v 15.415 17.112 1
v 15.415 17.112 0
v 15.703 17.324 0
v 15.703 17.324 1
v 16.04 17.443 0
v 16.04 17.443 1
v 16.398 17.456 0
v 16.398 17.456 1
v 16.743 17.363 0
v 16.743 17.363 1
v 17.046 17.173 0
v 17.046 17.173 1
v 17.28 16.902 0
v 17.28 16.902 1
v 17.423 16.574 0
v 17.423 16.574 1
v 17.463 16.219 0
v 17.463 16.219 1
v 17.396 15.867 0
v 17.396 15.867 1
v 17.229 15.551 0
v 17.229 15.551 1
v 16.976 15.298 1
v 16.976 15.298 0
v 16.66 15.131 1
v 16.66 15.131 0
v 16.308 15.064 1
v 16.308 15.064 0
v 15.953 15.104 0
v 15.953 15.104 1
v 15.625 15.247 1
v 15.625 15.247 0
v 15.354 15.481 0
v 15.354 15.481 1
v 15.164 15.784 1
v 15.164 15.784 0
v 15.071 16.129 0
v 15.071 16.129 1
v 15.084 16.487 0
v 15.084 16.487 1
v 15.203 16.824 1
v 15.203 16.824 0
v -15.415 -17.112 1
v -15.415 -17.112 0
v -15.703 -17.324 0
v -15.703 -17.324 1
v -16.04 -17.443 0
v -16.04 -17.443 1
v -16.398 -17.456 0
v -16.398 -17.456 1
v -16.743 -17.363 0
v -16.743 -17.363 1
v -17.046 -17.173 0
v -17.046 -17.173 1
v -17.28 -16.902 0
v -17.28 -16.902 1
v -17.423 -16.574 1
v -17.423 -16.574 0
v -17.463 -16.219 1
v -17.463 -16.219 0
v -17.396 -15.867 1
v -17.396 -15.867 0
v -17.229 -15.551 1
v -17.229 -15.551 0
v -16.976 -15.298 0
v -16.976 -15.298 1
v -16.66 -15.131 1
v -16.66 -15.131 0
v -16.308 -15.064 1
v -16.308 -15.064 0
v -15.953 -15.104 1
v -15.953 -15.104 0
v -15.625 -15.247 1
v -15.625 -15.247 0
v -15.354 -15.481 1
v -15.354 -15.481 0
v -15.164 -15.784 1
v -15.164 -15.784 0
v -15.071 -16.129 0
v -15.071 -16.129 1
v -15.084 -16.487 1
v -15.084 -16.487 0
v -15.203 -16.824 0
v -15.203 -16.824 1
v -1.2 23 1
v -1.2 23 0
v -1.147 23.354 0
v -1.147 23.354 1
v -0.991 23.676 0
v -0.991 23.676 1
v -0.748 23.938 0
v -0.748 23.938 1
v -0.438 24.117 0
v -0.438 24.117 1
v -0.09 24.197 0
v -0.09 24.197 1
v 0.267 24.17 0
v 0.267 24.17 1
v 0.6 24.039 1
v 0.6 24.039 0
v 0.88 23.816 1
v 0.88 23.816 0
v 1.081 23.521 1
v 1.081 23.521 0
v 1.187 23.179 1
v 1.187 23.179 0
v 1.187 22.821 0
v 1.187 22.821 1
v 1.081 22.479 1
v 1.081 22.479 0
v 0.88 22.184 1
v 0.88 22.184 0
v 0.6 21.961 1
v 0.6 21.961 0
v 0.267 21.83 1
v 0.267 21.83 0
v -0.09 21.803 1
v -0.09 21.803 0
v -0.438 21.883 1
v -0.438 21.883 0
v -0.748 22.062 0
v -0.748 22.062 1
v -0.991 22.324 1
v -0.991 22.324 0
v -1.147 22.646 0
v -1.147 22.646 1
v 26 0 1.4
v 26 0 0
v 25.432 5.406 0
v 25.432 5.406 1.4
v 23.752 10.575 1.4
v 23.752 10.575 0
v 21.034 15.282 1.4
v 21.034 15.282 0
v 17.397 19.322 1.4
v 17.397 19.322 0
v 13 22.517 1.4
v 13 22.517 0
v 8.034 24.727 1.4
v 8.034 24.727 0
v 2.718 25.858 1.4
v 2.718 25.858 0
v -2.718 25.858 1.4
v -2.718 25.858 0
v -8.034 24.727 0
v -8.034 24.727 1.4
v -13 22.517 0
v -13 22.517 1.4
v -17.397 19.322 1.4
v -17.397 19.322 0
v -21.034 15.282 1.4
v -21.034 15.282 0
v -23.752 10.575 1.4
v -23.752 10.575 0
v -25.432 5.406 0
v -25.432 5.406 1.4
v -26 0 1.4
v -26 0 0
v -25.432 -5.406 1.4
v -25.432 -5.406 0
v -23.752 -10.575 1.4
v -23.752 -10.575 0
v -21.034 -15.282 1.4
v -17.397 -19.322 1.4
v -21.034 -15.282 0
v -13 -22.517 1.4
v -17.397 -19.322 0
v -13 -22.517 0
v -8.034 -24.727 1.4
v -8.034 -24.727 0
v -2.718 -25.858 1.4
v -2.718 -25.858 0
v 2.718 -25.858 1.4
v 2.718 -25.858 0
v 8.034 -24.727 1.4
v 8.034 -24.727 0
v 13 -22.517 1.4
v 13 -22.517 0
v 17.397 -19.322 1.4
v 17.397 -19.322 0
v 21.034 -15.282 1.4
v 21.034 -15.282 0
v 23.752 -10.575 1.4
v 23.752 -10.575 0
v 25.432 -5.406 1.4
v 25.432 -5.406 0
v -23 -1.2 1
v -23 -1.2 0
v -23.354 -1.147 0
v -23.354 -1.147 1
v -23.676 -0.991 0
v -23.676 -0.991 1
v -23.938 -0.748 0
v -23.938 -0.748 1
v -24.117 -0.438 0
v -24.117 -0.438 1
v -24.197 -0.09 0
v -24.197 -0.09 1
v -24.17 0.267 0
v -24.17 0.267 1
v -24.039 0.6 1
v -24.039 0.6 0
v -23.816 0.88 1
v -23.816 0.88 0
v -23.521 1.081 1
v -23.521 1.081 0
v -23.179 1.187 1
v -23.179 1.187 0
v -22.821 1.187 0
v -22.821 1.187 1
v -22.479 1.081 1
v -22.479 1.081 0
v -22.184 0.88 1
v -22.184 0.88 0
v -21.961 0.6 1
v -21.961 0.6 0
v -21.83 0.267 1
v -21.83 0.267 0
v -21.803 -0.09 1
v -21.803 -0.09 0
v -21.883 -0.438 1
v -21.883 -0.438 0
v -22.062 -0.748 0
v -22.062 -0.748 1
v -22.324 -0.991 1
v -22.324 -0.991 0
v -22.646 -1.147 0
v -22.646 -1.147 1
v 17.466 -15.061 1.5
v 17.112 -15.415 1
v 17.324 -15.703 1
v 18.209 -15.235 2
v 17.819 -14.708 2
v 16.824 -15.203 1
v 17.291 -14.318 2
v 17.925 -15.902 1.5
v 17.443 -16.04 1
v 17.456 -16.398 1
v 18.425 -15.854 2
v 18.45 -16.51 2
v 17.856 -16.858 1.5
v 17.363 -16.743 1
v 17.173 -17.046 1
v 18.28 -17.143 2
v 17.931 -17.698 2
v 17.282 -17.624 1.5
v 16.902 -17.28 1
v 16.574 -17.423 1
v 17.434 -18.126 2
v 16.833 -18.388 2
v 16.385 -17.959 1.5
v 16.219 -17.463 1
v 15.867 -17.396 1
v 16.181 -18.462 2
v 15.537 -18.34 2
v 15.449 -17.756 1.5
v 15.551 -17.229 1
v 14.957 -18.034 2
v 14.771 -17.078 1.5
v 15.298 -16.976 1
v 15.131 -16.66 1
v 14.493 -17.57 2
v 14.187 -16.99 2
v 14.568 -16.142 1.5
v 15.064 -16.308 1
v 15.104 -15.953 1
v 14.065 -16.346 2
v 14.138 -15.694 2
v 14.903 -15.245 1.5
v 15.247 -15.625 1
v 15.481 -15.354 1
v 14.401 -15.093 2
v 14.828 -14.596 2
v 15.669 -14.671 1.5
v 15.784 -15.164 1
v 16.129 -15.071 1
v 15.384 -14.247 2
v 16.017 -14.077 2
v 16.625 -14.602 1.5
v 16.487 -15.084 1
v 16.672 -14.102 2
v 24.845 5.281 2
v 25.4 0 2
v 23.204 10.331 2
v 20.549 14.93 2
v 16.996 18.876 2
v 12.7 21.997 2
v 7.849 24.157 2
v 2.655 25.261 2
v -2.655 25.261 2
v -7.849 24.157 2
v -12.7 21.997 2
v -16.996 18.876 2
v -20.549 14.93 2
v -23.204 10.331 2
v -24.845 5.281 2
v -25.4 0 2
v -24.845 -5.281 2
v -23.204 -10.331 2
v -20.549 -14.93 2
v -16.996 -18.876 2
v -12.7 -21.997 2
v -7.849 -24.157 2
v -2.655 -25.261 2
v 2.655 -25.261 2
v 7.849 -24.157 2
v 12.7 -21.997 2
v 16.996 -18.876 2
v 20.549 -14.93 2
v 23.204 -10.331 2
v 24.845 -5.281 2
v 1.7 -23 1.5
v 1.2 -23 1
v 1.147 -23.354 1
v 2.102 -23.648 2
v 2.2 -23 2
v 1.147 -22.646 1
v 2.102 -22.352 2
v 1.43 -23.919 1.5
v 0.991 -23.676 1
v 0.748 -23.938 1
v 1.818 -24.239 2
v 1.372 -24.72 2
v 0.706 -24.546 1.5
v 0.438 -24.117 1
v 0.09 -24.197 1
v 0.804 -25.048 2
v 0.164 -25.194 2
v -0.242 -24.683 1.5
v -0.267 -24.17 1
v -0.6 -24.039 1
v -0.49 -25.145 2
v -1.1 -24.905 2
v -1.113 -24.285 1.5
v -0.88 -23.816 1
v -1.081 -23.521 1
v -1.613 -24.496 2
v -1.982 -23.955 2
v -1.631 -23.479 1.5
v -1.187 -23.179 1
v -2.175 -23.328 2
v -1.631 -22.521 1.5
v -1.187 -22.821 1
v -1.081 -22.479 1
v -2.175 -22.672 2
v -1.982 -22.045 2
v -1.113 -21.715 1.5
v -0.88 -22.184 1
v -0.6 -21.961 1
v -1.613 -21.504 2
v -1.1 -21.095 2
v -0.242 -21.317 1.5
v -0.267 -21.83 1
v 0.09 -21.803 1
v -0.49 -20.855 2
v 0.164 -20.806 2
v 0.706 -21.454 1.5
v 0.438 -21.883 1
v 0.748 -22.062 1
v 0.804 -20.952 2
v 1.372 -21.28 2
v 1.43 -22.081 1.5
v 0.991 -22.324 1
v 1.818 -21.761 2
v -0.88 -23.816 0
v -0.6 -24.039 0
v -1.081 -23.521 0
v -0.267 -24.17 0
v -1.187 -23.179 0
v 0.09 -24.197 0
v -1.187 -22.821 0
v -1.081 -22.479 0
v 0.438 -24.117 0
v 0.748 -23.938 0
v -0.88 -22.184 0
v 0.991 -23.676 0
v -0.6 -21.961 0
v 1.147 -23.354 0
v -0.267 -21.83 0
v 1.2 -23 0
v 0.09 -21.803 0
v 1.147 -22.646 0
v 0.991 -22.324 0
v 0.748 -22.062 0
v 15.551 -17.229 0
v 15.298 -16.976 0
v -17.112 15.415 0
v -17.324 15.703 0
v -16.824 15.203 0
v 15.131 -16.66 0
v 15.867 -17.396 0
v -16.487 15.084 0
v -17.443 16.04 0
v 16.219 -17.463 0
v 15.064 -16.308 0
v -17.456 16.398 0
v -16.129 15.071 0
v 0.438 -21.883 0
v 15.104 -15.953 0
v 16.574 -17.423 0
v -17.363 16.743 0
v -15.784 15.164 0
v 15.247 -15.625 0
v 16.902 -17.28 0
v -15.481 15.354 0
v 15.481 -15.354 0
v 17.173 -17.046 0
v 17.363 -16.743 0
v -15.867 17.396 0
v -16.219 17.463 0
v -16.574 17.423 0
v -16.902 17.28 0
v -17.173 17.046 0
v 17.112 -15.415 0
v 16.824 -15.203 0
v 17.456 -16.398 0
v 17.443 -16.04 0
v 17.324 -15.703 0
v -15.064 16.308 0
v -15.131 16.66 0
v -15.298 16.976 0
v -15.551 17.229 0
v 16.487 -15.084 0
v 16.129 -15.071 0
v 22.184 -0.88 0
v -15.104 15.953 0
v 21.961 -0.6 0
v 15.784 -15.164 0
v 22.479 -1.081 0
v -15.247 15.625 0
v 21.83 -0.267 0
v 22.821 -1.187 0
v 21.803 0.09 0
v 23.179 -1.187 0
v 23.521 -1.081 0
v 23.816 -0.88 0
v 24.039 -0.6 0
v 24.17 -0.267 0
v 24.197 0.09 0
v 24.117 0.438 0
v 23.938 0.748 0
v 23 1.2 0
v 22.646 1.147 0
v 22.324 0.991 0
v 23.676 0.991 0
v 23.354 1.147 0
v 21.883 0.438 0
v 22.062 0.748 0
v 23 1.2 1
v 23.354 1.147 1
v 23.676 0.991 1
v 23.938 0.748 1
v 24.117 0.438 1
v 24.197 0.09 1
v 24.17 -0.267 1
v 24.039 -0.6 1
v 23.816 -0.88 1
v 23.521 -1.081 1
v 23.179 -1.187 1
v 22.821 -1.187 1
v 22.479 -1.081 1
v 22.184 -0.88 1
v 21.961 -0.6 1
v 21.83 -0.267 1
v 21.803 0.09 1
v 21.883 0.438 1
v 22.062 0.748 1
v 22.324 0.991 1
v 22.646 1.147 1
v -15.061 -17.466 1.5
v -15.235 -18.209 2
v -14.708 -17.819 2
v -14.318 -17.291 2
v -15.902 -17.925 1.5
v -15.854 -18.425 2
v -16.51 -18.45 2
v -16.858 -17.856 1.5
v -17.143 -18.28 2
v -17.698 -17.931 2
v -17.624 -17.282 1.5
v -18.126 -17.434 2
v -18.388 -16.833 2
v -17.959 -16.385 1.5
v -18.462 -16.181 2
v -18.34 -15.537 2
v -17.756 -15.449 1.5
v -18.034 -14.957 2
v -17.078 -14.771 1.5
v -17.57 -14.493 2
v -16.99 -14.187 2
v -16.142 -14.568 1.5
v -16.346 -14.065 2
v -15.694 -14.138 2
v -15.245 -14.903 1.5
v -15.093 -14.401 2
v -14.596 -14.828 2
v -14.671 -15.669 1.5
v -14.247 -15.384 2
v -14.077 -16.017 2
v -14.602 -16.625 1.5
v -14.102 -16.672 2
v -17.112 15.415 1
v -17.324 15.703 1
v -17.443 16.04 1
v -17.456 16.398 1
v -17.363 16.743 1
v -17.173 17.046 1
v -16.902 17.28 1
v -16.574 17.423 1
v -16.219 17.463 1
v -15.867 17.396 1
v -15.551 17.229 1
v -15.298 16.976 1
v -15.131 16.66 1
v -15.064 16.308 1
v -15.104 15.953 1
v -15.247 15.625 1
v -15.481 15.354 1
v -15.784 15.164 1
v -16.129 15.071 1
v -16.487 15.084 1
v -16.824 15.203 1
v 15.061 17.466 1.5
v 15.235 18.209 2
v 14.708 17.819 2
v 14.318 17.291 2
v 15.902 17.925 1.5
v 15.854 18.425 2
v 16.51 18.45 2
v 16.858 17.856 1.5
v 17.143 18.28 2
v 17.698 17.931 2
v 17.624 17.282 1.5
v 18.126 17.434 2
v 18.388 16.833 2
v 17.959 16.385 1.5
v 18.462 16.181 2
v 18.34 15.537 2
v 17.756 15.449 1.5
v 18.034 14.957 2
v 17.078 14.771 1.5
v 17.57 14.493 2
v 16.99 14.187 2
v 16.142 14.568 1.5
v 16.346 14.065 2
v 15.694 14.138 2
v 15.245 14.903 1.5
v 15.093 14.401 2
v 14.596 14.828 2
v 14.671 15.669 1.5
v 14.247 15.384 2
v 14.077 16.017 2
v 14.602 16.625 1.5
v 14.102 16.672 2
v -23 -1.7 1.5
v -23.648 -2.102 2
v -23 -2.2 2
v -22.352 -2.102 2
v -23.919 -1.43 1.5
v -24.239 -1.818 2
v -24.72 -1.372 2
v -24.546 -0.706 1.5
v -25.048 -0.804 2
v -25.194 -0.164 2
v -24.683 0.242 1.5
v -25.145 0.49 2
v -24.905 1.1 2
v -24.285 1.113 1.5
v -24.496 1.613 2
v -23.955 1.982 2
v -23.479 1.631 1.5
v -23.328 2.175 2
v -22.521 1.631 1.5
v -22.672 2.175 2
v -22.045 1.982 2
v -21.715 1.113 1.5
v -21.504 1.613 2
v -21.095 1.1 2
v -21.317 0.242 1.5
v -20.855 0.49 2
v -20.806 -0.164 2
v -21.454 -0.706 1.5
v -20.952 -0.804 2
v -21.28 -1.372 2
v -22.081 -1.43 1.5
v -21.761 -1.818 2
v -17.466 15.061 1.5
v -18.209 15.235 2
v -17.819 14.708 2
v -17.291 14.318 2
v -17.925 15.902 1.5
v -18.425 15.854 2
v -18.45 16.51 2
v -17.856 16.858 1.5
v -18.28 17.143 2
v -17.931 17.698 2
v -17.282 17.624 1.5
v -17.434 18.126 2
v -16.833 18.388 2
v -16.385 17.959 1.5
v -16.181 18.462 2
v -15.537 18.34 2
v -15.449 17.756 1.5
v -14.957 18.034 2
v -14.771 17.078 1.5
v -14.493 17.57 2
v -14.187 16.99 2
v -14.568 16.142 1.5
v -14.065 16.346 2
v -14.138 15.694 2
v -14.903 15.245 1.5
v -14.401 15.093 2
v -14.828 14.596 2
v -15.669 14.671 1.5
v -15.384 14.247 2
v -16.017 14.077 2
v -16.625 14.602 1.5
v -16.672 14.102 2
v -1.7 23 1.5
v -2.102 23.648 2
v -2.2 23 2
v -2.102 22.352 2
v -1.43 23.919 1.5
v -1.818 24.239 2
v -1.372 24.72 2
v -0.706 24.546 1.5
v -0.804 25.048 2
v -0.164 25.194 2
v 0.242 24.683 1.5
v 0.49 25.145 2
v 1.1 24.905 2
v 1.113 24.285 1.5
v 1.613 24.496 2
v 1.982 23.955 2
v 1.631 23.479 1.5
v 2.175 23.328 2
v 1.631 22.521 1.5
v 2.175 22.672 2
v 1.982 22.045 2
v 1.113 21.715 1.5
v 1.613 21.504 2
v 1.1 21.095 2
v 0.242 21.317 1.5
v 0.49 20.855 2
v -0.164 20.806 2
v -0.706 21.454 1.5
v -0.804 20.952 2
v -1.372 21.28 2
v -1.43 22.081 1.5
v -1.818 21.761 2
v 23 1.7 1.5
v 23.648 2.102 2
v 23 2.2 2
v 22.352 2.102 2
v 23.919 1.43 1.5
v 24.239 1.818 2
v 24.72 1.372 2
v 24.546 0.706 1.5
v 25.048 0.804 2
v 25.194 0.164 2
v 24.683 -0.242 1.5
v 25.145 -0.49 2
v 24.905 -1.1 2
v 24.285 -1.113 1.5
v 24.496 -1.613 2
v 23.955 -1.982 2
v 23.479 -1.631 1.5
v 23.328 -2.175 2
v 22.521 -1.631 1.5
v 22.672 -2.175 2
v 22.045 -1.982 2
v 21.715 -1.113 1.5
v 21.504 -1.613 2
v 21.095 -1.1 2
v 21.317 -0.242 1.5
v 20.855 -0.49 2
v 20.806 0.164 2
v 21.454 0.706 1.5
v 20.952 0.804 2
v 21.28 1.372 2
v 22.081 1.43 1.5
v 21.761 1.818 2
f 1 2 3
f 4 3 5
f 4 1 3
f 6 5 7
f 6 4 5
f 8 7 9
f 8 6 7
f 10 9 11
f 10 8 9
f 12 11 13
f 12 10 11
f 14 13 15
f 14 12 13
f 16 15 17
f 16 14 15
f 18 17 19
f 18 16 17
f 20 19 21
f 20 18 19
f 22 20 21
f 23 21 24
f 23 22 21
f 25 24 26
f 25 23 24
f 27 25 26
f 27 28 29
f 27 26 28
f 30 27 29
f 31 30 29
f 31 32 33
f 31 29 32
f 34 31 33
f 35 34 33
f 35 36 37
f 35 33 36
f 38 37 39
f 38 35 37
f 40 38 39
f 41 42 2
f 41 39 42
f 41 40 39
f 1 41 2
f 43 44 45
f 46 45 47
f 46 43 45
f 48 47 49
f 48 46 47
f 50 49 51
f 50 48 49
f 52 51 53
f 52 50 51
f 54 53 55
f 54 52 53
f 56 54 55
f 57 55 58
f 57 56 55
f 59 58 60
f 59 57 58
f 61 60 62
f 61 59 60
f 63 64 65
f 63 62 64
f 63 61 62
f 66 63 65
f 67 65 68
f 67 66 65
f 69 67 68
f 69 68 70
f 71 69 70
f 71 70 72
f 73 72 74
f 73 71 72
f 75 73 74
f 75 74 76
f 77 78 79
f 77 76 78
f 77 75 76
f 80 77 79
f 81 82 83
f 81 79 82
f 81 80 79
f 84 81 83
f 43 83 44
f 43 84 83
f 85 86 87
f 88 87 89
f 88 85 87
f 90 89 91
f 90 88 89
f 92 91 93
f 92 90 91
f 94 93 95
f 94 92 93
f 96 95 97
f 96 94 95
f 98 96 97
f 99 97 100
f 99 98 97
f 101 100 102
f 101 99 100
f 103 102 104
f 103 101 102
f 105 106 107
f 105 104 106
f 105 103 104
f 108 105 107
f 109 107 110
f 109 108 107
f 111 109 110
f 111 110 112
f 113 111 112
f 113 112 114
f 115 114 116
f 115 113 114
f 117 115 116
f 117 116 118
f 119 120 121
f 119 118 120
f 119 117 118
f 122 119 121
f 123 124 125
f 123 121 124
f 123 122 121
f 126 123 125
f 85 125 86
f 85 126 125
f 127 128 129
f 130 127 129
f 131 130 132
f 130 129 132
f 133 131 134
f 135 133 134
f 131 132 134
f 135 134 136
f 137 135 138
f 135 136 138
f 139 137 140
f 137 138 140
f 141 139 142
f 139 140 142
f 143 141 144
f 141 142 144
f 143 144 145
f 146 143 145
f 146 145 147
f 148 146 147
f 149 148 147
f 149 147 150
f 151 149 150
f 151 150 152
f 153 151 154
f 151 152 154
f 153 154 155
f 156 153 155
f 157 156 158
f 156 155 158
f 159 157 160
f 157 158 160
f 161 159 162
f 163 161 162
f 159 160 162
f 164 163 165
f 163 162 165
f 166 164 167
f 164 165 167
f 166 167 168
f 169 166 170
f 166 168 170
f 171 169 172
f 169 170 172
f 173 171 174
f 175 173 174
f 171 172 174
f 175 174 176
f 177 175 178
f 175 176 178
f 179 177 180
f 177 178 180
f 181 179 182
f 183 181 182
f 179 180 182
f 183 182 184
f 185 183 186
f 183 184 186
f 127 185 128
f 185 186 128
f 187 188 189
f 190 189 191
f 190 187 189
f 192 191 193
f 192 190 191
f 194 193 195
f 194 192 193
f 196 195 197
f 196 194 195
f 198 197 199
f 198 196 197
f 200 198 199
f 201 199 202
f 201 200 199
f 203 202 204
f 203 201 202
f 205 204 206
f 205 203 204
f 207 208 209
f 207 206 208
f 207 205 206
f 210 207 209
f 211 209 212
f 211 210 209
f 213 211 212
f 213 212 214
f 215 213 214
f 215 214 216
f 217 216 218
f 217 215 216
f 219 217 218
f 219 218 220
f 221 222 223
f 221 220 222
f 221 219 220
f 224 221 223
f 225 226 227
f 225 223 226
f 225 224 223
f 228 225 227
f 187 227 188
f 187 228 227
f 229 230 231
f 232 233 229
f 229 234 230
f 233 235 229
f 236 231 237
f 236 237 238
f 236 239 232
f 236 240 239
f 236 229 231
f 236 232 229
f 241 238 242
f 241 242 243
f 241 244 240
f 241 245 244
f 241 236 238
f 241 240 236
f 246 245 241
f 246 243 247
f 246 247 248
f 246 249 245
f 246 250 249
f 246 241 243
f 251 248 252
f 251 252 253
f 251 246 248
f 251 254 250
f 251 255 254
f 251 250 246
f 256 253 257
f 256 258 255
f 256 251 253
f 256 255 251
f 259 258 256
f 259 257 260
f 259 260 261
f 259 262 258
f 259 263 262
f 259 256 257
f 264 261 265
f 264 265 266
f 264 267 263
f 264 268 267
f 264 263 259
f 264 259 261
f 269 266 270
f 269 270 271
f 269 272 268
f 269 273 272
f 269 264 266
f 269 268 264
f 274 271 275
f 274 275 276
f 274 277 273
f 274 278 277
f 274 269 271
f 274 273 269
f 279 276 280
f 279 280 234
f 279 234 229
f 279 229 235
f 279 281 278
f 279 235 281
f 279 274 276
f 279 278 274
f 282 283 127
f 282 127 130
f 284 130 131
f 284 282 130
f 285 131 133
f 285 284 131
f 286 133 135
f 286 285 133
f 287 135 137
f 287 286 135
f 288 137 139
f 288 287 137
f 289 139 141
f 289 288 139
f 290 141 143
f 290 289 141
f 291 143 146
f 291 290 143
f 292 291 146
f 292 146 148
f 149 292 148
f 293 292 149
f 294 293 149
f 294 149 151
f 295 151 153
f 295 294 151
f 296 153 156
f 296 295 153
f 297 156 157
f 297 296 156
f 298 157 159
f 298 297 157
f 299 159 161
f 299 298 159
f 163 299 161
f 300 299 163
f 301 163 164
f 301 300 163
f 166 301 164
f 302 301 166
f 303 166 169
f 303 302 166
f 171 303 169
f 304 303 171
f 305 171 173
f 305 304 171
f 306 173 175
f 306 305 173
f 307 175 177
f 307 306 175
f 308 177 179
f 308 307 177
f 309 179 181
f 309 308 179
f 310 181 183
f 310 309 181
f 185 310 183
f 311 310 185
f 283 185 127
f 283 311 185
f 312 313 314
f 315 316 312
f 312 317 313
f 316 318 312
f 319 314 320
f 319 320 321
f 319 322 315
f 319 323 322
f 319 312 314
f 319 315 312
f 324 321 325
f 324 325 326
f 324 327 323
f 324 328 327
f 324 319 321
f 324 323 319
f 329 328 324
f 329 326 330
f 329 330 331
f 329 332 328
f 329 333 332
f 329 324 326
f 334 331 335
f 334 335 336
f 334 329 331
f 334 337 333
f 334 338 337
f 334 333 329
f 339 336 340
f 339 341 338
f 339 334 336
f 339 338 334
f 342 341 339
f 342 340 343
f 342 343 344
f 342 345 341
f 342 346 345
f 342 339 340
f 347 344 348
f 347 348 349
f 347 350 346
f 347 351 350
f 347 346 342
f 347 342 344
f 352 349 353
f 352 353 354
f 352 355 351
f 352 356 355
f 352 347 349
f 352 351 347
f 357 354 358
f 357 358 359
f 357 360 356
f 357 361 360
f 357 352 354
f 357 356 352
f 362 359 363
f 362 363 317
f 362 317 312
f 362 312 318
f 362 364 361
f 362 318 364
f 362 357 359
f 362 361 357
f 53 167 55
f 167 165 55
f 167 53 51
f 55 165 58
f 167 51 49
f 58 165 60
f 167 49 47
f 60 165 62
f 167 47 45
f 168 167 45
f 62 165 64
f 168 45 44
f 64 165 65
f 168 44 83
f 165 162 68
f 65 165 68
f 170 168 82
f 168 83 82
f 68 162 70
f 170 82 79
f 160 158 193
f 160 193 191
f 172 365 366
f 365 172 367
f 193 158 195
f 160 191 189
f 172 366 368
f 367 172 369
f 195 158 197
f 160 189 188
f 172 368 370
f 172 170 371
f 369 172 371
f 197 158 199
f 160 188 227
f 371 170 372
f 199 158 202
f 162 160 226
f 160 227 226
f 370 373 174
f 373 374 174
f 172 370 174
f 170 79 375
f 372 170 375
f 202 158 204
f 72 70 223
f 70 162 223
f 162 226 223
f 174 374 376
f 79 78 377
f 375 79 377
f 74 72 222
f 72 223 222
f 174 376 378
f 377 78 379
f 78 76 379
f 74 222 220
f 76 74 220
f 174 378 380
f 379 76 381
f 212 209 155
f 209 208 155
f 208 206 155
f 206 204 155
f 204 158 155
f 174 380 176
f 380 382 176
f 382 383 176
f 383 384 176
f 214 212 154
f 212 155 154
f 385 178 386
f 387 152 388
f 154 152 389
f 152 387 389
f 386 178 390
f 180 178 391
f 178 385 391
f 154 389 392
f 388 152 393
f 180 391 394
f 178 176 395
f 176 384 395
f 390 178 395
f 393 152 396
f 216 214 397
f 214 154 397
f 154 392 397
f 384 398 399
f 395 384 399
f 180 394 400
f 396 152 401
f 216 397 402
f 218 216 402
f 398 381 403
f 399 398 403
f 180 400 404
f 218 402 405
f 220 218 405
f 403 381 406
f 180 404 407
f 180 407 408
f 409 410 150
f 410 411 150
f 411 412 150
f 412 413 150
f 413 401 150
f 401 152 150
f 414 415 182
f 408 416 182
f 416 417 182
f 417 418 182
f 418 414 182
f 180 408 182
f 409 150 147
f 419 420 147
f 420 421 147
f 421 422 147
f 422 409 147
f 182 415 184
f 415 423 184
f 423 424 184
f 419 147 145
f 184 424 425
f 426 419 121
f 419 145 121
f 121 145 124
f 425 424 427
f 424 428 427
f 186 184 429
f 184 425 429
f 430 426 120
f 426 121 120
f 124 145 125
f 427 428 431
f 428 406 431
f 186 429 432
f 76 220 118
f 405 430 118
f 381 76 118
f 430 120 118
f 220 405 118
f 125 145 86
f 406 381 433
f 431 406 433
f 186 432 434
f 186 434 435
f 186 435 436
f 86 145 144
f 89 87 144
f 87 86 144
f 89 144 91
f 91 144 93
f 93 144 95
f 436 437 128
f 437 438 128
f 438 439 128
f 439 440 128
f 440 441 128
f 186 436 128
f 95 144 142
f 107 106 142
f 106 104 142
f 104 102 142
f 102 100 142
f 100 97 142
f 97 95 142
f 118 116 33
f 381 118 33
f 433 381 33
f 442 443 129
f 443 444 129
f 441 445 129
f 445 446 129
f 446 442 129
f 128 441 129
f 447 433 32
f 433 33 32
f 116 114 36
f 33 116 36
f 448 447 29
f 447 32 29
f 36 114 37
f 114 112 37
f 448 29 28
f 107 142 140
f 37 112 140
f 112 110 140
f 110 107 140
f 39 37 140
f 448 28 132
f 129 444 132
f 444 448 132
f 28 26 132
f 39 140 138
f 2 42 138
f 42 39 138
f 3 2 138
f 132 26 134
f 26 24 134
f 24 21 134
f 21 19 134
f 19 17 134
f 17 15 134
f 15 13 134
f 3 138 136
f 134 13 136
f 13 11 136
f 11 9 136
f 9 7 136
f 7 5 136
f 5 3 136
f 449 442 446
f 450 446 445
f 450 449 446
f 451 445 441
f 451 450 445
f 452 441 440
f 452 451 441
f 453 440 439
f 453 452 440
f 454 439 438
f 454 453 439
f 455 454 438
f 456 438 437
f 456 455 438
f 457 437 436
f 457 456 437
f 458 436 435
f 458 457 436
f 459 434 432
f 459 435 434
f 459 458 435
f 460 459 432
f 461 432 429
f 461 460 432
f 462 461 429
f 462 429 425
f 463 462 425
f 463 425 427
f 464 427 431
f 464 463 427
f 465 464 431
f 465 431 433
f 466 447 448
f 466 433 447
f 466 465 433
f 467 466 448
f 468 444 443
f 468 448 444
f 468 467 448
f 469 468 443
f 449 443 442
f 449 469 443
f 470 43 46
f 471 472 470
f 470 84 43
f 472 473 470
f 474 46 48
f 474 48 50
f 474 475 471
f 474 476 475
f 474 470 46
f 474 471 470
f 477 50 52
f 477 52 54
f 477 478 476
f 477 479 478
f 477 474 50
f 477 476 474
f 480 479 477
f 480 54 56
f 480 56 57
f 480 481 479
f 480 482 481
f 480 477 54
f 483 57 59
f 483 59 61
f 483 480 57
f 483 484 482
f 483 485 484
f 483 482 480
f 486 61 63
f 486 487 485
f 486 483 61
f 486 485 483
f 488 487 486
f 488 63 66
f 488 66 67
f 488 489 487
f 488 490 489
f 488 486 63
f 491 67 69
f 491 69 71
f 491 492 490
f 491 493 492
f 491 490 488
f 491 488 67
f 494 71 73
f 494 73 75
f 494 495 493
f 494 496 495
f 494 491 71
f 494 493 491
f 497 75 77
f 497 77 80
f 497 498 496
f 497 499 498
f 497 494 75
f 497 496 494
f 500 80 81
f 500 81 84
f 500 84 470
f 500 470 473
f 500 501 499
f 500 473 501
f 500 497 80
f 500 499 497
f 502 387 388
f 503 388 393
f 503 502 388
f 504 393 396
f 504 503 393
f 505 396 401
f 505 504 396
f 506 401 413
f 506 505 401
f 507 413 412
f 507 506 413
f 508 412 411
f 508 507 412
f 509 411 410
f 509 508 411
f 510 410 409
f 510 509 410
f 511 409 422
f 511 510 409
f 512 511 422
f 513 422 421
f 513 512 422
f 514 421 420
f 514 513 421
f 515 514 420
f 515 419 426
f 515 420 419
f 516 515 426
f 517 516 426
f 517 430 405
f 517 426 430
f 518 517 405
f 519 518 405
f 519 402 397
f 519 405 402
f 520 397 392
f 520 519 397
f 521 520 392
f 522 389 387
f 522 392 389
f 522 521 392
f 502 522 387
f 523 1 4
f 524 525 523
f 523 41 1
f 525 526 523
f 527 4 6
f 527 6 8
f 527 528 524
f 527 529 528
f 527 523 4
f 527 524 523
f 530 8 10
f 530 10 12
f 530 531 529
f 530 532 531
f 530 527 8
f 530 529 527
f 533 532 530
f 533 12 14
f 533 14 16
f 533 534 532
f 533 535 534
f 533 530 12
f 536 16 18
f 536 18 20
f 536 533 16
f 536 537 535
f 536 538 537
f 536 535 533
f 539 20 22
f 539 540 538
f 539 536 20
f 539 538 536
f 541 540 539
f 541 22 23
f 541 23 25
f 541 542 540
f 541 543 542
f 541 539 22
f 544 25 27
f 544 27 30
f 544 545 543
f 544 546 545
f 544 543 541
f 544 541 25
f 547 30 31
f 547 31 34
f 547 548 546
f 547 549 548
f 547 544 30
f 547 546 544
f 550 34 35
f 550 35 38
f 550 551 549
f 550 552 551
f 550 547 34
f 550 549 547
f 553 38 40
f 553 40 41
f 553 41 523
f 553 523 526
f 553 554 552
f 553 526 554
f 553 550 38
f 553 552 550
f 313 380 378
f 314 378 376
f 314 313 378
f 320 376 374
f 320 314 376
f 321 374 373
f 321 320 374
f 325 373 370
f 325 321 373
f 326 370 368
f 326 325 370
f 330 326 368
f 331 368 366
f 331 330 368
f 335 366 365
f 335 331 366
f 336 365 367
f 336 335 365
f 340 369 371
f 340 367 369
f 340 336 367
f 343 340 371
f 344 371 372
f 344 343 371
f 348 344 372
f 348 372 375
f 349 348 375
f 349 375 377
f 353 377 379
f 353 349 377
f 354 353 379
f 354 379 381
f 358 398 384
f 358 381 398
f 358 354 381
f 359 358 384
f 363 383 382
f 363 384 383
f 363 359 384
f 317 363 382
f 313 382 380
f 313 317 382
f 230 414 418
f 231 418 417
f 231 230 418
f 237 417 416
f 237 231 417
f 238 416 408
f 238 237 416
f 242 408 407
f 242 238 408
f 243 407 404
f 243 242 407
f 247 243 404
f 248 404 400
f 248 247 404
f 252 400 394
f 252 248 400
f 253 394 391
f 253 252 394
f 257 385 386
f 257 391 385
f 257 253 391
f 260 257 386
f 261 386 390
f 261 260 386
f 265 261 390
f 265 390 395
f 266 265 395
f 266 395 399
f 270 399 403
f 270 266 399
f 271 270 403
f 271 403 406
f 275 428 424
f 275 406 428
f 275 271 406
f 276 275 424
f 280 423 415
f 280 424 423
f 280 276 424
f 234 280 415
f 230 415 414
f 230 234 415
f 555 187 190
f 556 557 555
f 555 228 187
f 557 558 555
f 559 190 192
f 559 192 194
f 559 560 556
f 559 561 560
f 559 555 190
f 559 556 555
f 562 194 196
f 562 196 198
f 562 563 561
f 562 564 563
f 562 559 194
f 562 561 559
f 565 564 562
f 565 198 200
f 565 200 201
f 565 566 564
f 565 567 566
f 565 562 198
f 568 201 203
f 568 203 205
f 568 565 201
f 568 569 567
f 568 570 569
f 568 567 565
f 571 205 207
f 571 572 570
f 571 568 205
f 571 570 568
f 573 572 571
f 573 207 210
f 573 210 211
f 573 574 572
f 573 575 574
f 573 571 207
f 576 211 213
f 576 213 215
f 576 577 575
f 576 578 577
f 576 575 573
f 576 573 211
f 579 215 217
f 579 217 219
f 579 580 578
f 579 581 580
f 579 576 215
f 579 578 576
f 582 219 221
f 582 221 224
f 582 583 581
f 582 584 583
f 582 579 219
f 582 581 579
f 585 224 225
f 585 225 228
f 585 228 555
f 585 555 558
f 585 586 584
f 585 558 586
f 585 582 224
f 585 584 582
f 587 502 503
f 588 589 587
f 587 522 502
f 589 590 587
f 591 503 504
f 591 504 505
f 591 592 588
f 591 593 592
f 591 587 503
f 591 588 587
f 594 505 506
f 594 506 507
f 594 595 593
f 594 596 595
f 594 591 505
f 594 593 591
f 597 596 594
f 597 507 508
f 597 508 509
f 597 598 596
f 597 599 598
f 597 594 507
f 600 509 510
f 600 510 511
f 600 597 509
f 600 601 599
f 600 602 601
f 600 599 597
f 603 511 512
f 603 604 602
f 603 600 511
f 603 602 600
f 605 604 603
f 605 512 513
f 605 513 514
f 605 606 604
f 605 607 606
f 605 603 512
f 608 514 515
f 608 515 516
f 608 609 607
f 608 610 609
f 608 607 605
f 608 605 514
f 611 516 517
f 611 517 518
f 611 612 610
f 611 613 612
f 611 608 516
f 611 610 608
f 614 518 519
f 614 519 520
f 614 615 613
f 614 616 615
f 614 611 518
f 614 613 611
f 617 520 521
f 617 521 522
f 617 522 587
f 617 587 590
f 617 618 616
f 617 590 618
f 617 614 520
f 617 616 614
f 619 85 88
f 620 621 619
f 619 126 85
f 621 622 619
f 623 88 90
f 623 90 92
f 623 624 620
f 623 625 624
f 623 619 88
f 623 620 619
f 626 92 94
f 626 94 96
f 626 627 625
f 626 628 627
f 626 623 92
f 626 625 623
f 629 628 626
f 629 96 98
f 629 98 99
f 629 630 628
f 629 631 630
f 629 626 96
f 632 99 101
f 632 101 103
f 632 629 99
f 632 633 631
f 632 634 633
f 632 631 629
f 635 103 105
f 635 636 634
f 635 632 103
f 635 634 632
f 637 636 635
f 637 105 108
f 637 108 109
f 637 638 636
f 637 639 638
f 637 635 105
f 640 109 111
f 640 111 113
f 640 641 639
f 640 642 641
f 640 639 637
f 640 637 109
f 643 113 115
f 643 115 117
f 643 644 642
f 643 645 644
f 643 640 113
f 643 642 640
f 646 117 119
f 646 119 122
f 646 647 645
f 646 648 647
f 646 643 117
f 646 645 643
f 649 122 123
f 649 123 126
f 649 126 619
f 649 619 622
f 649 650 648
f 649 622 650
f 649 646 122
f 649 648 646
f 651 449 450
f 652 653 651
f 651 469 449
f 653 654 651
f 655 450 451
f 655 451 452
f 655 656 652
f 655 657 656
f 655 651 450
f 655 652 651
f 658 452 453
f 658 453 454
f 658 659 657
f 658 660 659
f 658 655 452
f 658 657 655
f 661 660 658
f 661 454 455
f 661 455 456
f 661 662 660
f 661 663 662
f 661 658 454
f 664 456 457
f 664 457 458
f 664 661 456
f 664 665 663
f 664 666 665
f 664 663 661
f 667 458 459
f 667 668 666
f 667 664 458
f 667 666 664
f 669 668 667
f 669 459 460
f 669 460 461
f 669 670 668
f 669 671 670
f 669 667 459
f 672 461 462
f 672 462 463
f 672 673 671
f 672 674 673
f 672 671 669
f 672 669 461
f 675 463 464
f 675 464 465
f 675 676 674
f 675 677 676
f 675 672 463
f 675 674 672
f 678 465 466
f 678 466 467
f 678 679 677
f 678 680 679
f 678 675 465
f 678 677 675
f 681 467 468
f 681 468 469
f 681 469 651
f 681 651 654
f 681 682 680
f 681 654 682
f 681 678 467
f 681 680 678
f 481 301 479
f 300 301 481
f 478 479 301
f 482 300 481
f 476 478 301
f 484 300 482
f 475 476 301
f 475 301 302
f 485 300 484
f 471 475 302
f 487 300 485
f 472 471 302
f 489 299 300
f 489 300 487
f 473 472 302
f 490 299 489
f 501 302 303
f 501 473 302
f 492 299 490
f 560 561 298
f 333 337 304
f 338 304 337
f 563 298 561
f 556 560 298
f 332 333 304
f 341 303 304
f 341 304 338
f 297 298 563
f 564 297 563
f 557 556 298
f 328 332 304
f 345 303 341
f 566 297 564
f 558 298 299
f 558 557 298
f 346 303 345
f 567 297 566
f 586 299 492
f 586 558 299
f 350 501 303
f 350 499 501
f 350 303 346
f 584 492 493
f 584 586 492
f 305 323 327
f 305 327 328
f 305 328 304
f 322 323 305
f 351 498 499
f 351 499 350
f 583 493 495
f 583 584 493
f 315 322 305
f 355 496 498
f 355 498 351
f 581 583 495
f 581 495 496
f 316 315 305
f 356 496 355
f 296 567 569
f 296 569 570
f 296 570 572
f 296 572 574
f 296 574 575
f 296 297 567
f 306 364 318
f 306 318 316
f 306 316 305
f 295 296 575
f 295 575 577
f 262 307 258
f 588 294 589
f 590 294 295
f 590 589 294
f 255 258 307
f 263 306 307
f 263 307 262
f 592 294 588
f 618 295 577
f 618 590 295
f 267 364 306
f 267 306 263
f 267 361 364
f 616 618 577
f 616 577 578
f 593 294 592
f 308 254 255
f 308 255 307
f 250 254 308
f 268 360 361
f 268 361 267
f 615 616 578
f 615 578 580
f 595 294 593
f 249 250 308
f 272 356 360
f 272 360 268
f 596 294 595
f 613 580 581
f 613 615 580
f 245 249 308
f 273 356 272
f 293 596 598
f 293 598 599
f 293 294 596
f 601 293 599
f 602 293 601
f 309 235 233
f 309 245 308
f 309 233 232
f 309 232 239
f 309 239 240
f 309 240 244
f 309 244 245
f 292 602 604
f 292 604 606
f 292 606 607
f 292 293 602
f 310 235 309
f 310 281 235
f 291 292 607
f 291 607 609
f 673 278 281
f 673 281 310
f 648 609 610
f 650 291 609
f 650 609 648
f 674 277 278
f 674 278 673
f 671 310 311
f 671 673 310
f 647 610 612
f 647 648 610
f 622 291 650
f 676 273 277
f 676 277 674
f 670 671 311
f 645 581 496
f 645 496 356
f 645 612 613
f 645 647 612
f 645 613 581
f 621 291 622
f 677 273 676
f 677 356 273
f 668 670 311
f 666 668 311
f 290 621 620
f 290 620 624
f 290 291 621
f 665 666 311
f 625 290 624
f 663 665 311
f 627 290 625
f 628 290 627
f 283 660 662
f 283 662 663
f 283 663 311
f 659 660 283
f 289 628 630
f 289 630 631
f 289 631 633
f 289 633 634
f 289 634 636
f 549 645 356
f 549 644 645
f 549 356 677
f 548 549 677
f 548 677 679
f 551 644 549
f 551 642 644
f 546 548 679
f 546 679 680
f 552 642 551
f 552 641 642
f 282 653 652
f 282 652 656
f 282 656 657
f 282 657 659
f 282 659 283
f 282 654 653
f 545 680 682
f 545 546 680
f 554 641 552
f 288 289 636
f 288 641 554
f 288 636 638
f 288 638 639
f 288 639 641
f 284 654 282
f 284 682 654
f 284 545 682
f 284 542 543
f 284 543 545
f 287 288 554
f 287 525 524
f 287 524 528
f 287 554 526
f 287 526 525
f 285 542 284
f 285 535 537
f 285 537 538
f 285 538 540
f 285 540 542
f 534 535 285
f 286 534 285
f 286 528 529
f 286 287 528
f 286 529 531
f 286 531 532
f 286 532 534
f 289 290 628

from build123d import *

# Parameters (mm, degrees)
SKETCH_1_R               = 26
EXTRUDE_1_DEPTH          = 2
CHAMFER_2_SIZE           = 0.6
PATTERN_CIRCULAR_1_COUNT = 8


with BuildPart() as part:
    # Эскиз1 → Бобышка-Вытянуть1 (new body)
    with BuildSketch(Plane.XY):
        Circle(SKETCH_1_R)
    extrude(amount=EXTRUDE_1_DEPTH)

    # Фаска2
    chamfer_2_edges = [part.edges().sort_by_distance(p)[0] for p in [
        (-26, 0, 2),
    ]]
    chamfer(chamfer_2_edges, length=CHAMFER_2_SIZE)

    # Эскиз3 → Зенковка для винта с полупотайной головкой M21 (revolve, cut)
    with BuildSketch(Plane(origin=(-23, 0, 2), x_dir=(0, -1, 0), z_dir=(1, 0, 0))):
        Polygon((0, 0), (0, 6.721032743), (1.2, 6), (1.2, 1), (2.2, 0), align=None)
    hole_wizard_m21 = revolve(axis=Axis((-23, 0, 8.35), (0, 0, -1)), mode=Mode.SUBTRACT)

    # Круговой массив1: Зенковка для винта с полупотайной головкой M21 ×8 about axis
    pattern_circular_1_axis = Axis((0, 0, 0), (0, 0, 1))
    for i in range(1, PATTERN_CIRCULAR_1_COUNT):
        add(hole_wizard_m21.rotate(pattern_circular_1_axis, i * 360 / PATTERN_CIRCULAR_1_COUNT), mode=Mode.SUBTRACT)


solid = part.part
